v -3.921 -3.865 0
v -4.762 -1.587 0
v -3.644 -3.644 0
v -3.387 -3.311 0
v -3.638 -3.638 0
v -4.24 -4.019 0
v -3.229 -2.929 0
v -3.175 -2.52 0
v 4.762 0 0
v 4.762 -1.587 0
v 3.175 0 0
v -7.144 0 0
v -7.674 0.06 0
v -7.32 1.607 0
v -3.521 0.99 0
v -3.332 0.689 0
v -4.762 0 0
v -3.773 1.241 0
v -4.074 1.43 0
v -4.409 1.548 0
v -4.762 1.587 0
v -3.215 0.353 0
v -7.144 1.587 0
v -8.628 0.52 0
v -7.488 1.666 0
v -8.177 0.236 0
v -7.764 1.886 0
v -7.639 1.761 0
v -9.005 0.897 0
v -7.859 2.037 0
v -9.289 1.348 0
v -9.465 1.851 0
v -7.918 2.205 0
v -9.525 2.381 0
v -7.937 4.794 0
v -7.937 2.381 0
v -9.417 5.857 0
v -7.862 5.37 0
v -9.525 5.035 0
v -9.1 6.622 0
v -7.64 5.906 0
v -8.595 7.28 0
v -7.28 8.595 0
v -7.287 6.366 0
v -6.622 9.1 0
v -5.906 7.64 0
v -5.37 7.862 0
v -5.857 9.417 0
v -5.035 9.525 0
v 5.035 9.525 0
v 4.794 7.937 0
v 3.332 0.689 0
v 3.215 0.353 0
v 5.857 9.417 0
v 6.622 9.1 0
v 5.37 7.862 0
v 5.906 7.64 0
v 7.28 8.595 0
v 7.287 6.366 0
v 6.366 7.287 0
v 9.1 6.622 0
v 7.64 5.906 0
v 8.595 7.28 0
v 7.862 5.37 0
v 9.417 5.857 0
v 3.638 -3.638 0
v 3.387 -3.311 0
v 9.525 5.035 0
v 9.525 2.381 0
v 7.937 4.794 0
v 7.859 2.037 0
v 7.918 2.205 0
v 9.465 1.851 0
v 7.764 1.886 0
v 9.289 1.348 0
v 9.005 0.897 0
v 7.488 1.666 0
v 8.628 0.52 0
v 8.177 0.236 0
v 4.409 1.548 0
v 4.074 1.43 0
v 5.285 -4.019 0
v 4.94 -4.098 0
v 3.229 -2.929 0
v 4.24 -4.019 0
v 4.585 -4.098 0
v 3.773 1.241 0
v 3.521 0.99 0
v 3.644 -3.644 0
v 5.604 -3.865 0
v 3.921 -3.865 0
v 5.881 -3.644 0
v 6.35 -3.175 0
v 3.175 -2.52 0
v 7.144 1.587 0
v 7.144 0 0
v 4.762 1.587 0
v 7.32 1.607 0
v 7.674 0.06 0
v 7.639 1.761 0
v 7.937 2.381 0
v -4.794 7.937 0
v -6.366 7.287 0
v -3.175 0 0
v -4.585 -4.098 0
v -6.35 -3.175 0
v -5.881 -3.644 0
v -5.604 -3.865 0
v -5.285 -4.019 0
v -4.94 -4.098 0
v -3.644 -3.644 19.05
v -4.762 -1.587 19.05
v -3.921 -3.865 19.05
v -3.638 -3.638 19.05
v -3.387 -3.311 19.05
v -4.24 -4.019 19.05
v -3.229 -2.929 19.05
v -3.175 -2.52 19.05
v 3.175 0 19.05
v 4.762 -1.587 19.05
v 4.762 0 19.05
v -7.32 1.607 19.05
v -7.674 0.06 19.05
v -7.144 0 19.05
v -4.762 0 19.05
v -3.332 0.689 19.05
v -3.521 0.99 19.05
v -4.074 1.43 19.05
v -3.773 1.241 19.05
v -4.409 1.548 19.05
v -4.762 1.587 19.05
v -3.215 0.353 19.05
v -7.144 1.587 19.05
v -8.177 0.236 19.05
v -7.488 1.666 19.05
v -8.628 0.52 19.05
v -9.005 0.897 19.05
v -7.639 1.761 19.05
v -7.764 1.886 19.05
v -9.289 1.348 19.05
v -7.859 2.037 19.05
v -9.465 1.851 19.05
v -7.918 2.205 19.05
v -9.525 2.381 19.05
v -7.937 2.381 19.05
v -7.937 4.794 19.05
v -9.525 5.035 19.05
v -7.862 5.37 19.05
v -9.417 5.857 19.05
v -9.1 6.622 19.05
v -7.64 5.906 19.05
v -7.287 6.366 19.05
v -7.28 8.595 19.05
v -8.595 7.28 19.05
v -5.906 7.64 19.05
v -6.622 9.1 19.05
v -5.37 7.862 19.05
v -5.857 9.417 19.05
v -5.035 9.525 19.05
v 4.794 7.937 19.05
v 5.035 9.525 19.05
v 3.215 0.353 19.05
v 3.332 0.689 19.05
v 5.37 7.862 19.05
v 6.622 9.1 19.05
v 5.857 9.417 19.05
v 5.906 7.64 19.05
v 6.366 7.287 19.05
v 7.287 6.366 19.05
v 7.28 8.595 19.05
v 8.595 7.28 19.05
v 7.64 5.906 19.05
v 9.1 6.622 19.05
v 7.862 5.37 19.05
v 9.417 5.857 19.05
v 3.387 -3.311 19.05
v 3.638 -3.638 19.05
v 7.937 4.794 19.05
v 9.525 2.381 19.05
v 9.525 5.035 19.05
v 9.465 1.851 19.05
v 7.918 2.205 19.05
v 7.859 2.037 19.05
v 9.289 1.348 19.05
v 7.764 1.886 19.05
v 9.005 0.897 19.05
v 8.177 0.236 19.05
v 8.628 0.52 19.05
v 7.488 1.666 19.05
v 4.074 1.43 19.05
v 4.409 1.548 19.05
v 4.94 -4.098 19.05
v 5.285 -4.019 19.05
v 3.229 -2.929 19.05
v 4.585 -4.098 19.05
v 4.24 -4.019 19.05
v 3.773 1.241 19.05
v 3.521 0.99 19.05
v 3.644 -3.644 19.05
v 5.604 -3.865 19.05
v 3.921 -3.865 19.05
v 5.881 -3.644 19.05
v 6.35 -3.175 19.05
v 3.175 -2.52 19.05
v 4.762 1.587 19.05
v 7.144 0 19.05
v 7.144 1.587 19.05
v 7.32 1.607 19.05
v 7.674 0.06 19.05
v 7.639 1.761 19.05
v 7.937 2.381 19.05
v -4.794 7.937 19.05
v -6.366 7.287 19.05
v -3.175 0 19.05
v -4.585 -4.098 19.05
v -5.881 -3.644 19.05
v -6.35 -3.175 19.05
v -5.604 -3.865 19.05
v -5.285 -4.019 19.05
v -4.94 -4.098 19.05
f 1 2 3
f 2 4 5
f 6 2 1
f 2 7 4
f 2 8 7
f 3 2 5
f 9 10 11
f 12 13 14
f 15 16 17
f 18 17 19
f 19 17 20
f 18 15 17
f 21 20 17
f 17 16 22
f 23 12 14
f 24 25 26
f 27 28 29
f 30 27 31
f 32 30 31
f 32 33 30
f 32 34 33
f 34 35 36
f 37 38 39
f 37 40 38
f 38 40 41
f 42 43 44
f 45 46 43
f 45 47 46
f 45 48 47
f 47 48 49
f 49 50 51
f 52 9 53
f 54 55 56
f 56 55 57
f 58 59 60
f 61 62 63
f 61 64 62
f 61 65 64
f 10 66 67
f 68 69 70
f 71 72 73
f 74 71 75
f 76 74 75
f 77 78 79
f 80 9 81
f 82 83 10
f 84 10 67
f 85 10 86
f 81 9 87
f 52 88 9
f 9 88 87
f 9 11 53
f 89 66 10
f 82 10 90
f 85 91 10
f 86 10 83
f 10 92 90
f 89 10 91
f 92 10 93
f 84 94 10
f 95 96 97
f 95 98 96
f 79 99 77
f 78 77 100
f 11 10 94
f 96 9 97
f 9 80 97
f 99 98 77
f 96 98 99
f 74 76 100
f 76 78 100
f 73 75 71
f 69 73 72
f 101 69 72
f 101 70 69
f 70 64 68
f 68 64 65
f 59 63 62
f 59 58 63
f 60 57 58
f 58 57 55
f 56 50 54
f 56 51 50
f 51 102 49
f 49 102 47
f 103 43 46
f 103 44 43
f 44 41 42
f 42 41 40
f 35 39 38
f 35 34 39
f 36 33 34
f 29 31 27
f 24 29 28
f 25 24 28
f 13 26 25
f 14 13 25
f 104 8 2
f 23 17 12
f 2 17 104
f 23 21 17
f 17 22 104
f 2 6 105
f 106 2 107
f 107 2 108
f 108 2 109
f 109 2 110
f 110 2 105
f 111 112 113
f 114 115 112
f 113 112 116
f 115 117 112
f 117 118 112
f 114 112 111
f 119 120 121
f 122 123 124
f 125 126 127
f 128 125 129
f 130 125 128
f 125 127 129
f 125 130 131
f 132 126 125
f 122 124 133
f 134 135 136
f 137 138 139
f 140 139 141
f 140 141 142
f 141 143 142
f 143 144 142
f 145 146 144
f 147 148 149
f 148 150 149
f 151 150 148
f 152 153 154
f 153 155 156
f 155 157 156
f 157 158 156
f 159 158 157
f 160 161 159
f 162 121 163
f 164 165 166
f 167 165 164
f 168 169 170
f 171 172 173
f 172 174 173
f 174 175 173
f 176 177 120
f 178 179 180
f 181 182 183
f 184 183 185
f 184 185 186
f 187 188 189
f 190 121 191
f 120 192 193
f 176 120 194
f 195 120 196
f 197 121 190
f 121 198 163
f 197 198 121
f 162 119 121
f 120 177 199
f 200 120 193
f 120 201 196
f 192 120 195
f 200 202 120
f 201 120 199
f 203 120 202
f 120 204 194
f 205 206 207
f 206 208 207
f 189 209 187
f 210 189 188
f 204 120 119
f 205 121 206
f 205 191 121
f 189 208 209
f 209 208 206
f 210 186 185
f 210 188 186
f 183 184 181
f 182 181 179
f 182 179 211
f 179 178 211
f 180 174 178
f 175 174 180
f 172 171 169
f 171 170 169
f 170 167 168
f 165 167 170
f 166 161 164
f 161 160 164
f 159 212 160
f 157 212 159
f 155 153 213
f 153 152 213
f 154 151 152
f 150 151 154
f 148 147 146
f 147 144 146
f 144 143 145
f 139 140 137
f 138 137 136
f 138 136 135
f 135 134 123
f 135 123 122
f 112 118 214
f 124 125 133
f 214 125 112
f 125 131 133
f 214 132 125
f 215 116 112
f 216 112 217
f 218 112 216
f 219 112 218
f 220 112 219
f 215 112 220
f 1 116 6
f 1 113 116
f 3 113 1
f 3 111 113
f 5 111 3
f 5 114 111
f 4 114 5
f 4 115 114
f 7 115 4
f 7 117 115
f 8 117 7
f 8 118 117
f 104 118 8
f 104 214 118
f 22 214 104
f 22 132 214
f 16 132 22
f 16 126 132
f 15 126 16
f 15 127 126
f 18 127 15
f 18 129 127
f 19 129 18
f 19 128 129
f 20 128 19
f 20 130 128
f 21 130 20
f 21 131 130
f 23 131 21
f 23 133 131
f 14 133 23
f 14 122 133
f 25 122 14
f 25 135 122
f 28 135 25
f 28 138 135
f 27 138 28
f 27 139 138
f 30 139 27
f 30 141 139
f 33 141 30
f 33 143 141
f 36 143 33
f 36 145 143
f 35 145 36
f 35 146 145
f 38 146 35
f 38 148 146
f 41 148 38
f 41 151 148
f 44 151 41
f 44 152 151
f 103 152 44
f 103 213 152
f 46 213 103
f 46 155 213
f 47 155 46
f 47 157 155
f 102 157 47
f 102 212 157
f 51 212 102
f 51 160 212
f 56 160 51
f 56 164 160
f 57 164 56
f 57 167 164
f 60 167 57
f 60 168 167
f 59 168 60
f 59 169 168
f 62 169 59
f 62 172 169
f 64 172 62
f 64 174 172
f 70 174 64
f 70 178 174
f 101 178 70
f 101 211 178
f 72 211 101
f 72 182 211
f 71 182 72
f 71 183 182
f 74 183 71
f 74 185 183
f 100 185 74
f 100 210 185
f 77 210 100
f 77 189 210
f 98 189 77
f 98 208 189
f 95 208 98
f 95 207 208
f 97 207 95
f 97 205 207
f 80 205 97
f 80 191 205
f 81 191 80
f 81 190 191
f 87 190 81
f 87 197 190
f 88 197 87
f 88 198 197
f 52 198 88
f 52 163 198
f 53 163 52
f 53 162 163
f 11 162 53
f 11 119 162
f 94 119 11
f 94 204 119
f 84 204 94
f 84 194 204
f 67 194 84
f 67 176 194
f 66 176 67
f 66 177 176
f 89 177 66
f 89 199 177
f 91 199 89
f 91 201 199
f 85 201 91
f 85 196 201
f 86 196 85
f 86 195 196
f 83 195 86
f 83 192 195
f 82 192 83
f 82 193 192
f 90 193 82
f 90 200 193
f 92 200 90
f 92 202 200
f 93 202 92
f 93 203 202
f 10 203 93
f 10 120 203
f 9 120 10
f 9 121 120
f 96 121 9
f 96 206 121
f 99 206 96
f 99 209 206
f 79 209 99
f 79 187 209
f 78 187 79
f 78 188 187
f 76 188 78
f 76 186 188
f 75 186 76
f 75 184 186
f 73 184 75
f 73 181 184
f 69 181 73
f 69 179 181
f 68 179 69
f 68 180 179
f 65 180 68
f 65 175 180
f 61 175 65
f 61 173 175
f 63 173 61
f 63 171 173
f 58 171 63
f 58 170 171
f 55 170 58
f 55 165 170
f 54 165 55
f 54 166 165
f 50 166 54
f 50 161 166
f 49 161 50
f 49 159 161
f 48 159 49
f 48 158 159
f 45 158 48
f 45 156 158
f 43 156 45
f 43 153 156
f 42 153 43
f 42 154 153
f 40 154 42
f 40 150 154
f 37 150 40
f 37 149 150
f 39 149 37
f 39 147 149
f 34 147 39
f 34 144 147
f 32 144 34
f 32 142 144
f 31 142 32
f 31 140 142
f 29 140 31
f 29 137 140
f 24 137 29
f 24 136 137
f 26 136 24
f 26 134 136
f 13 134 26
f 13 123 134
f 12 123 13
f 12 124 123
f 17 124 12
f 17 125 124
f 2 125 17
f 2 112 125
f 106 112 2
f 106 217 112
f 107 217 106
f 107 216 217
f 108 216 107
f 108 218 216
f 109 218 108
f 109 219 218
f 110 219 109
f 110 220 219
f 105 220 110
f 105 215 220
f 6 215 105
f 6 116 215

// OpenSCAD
// file: ../lib/TOGArrayLib1.scad
// TOGArrayLib1.5
// 
// Functions for working with arrays.
// 
// v1.1:
// - tal1_reduce assert(is_list(items)) to prevent infinite recursion
//   when given undefined or other non-list values
// v1.1.1:
// - Fix tal1_uniq_remap_v2 to return "list-remap-result" as the
//   first element of the returned list
// v1.2:
// - Add tal1_replace_at function
// v1.3:
// - tal1_is_vec_of, tal1_is_vec_of_num
// v1.4:
// - tal1_assert_for_each, for when you want to assert something
//   about each of a list of items and get nice failure messages
// v1.5:
// - Add tal1_duplicate_reversed function, which may be
//   handy when generating symmetrical polygons and stuff.

/**
 * Make a list with the contents of list `a`,
 * but starting at offset `off`, replaced by the contents of list `b`.
 * len(result) = max(len(a), off+len(b))
 */
function tal1_replace_at(a, off, b, default_value=undef, default_value_function=undef) =
	assert(is_list(a))
	assert(is_list(b))
	let( _dvf = !is_undef(default_value_function) ? default_value_function : function(i) default_value )
[
	for( i=[0:1:min(off,len(a))-1] ) a[i],
	for( i=[len(a):1:off-1] ) _dvf(i),
	for( i=[off:1:off+len(b)-1] ) b[i-off],
	for( i=[off+len(b):1:len(a)-1] ) a[i],
];

// Simplest case
assert([] == tal1_replace_at([], 0, []));
// Second simplest cases
assert(["foo"] == tal1_replace_at(["foo"], 0, []));
assert(["foo"] == tal1_replace_at([], 0, ["foo"]));
// Replace one item
assert(["foo","quux","baz"] == tal1_replace_at(["foo","bar","baz"], 1, ["quux"]));
// Replace and extend
assert(["foo","quux","tuna","tina"] == tal1_replace_at(["foo","bar","baz"], 1, ["quux", "tuna", "tina"]));
// Add beyond end of `a`
assert(["foo","zzz","quux"] == tal1_replace_at(["foo"], 2, ["quux"], default_value="zzz"));
// Adding 'nothing' should still fill to that point with defaults
assert(["foo","zzz","zzz"] == tal1_replace_at(["foo"], 3, [], default_value="zzz"));


function tal1_reduce(start, items, func, offset=0) =
	assert(is_list(items))
	len(items) == offset ? start :
	tal1_reduce(func(start, items[offset]), items, func, offset+1);

function tal1_consecutive_duplicate_count(items) = tal1_reduce(
	[0, undef],
	items,
	function(z,item) [z[0] + (item == z[1] ? 1 : 0), item]
)[0];

assert(0 == tal1_consecutive_duplicate_count([]));
assert(0 == tal1_consecutive_duplicate_count([50]));
assert(1 == tal1_consecutive_duplicate_count([50,50]));
assert(0 == tal1_consecutive_duplicate_count([50,51,52,53]));
assert(1 == tal1_consecutive_duplicate_count([50,51,52,52]));
assert(3 == tal1_consecutive_duplicate_count([50,50,50,50]));

// Set test_size to arbirarily large values
// to ensure that OpenSCAD can handle heavy recursion
let(test_size=1000) assert(test_size/2 == tal1_consecutive_duplicate_count([for(i=[0:1:test_size-1]) floor(i/2)]));



function tal1_uniq_(items, off0, off1) =
	let(chunklen = off1-off0)
	chunklen == 0 ? [] :
	chunklen == 1 ? [items[off0]] :
	let(half=floor(chunklen/2))
	let(left  = tal1_uniq_(items, off0     , off0+half))
	let(right = tal1_uniq_(items, off0+half, off1     ))
	assert(len(left) > 0)
	assert(len(right) > 0)
	left[len(left)-1] == right[0] ? [each left, for(i=[1:1:len(right)-1]) right[i]] :
	[each left, each right];

/** Given a list of items, returns a new list with identical consecutive items merged */
function tal1_uniq(items) = tal1_uniq_(items, 0, len(items));

assert([] == tal1_uniq([]));
assert([123] == tal1_uniq([123]));
assert([55,0,1,2,3] == tal1_uniq([55,0,1,2,3]));
assert([55,0,1,2] == tal1_uniq([55,0,1,1,2]));
assert([55,0,1] == tal1_uniq([55,55,0,0,0,0,0,0,1,1,1,1]));
assert([55,0] == tal1_uniq([55,0,0,0,0,0,0,0]));



/**
 * Returns [new items, old index -> new index mapping].
 * No-op version.
 */
function tal1_uniq_remap_v1(items) =
	["list-remap-result", items, [for (vi=[0:1:len(items)-1]) vi]];

// [a, a, b, b, c, c]
//
// [a,    ...], []  -> [a],[0]
// [a, a, ...], [0] -> [a],[0,0]

assert([1,2,3] == [1,2,3]);

/**
 * Recursive version that will combine adjacent identical vertexes,
 * but will use the original items.
 */
function tal1_uniq_remap_v2(items, map=[]) =
	let(index = len(map))
	len(items) == index ? ["list-remap-result", items, map] :
	index == 0 ? tal1_uniq_remap_v2(items, [0]) :
	items[index] == items[map[index-1]] ? tal1_uniq_remap_v2(items, [for(vi=map) vi, map[index-1]]) :
	tal1_uniq_remap_v2(items, [for(vi=map) vi, index]);

assert(tal1_uniq_remap_v2([1,1,2,2,3,4]) == ["list-remap-result", [1,1,2,2,3,4], [0,0,2,2,4,5]]);


/**
 * Returns true if `vec` is a list of at least min_len items
 * and component_check(each item, even those beyond min_len) is true.
 */
function tal1_is_vec_of(vec, min_len=0, component_check=function(x) true) =
	assert(is_num(min_len) && min_len >= 0)
	assert(is_function(component_check))
	is_list(vec) && len(vec) >= min_len &&
	tal1_reduce(true, vec, function(prev,item) prev && component_check(item));

function tal1_is_vec_of_num(vec, min_len=0) = tal1_is_vec_of(vec, min_len, function(i) is_num(i));

assert( true == tal1_is_vec_of_num([1,2,3]));
assert( true == tal1_is_vec_of_num([]));
assert( true == tal1_is_vec_of_num([1,2,3], 3));
assert(false == tal1_is_vec_of_num([1,2], 3));
assert(false == tal1_is_vec_of_num([1,2,"spoon"], 3));
// Requirements are ambiguous when
// first min_len items are numbers, but there are non-numeric items afterwards,
// so let's error on the side of saying 'no, it's not a list of numbers';
// i.e. the item check and the min_len are independent.
assert(false == tal1_is_vec_of_num([1,2,3,"artichoke"], 3));


/**
 * Asserts that item_checker(each item in list, index of item)[0] is true.
 * Second element of item_checker return value is assertion message.
 * Returns the original list, in case that's useful to you.
 */
function tal1_assert_for_each(list, item_checker) =
	let( _ignored = [ for(i=[0:1:len(list)-1])
		let(q=item_checker(list[i],i))
		let(passed=is_bool(q) ? q : is_list(q) ? q[0] : assert(false, str(
			"tal1_assert_for_each: item_checker should return Bool|[Bool,String], but returned ",
			q, " for item at index ", i)))
		let(message=is_list(q) ? q[1] : undef)
		assert(passed, message)
		q
	])
	list;

// Callback can return a boolean...
assert([1,2,3] == tal1_assert_for_each([1,2,3], function(v,i) is_num(v)));
// ...or a [boolean, string]
assert([1,2,3] == tal1_assert_for_each([1,2,3], function(v,i) [is_num(v), "element be a num"]));

// [a, b, c] -> [a, b, c, rxf(c), rxf(b), rxf(a)]
function tal1_duplicate_reversed(list, rxf=function(item) item) =
	[
		each list,
		for( i=[len(list)-1 : -1 : 0] ) rxf(list[i]),
	];
// file: ../lib/TOGComplexLib1.scad
function tcplx1_multiply(a, b) =
	[a[0]*b[0] - a[1]*b[1], a[0]*b[1] + a[1]*b[0]];
function tcplx1_divide(a, b) =
	let(bot = (b[0]*b[0] + b[1]*b[1]))
	[
		(a[0]*b[0] + a[1]*b[1])/bot,
		(a[1]*b[0] - a[0]*b[1])/bot
	];

assert([-11,23] == tcplx1_multiply([3,2], [1,7]));

assert([-1,3] == tcplx1_multiply([3,1], [0,1]));
assert([-1,3] == tcplx1_multiply([0,1], [3,1]));

echo(tcplx1_divide([-1,3], [3,1]));
assert([0,1] == tcplx1_divide([-1,3], [3,1]));

function tcplx1_normalize(vec) =
	let(veclen = sqrt(vec[0]*vec[0]+vec[1]*vec[1]))
	[vec[0] / veclen, vec[1] / veclen];

function tcplx1_relative_turnvec_vv(v0, v1) =
	tcplx1_divide(tcplx1_normalize(v1), tcplx1_normalize(v0));

function tcplx1_relative_turnvec_abc(p0, p1, p2) = tcplx1_relative_turnvec_vv(p1-p0, p2-p1);

// A 90-degree turn
assert([0,1] == tcplx1_relative_turnvec_abc([0,0], [1,0], [1,1]));
assert([0,1] == tcplx1_relative_turnvec_abc([0,0], [0,1], [-1,1]));

// A 45-degree turn
assert(tcplx1_normalize([1,1]) == tcplx1_relative_turnvec_abc([0,0], [1,0], [ 2,1]));
assert(tcplx1_normalize([1,1]) == tcplx1_relative_turnvec_abc([0,0], [0,1], [-1,2]));


function tcplx1_relative_angle_abc(p0, p1, p2) =
	let(turnvec = tcplx1_relative_turnvec_abc(p0, p1, p2))
	atan2(turnvec[1], turnvec[0]);

assert(-135 == tcplx1_relative_angle_abc([0,0], [1,0], [0,-1]));
assert( -90 == tcplx1_relative_angle_abc([0,0], [1,0], [1,-1]));
assert(   0 == tcplx1_relative_angle_abc([0,0], [1,0], [2, 0]));
assert(  90 == tcplx1_relative_angle_abc([0,0], [1,0], [1, 1]));
assert( 135 == tcplx1_relative_angle_abc([0,0], [1,0], [0, 1]));

assert(  90 == tcplx1_relative_angle_abc([1,1], [3,3], [1, 5]));
// file: ../lib/TOGMod1Constructors.scad
// TOGMod1Constructors-v1.11
// 
// Functions to construct objects understood by TOGMod1
// 
// v1.1:
// - Add togmod1_make_rounded_rect
// v1.2:
// - togmod1_make_rounded_rect can make ovals
// v1.3:
// - togmod1_circle_points, to just get the points of a circle
// - if pos parameter to circle function has a third element,
//   returned vertexes will include it as the z component;
// v1.3.1
// - Some assertions
// v1.4:
// - Refactor togmod1_rounded_rect_points and togmod1_circle_points
//   to use togmod1__make_nd_vector_adder for adapting to whatever
//   `pos` parameter is.
// v1.5:
// - togmod_rounded_rect_points will not simplify completely rounded sides
//   (where length of side is exactly twice the rounding radius)
//   unless simplify_rounded_sides=true
//   - This makes it more useful for polyhedron generation,
//     where radius varies, but number of points must remain constant.
// v1.6:
// - togmod1_make_rect makes a simple rectangle
// - togmod1_make_rounded_rect will defer to togmod1_make_rect when r=0
// v1.7:
// - togmod1_make_circle will return empty shape (["union"]) when d=0
// v1.8:
// - Add togmod1_text
// v1.9:
// - togmod1_circle_points uses 3 as minimum circle point count instead of 6
// v1.10:
// - Fix togmod1_linear_extrude_y so that range corresponds to Y start/end and
//   polygon X,Y correspond to X,Z.  Previously it was rotated wrongly,
//   which would have gone unnoticed for symmetrical shapes centered at 0,0.
// v1.11:
// - Remove an 'echo'

use <./TOGArrayLib1.scad>

function togmod1__make_nd_vector_adder(origin=[0,0]) =
	let(origin_is_zero = tal1_reduce(true, origin, function(prev,item) prev && item == 0))
	origin_is_zero ? (function(vec) len(vec) >= len(origin) ? vec : tal1_replace_at(origin, 0, vec)) :
	function(vec) [
		for(i=[0:1:max(len(origin),len(vec))-1]) (len(vec) > i ? vec[i] : 0) + (len(origin) > i ? origin[i] : 0),
	];

assert([1,2,3] == togmod1__make_nd_vector_adder()([1,2,3]));
assert([1,2,3] == togmod1__make_nd_vector_adder([0,0,3])([1,2]));


function togmod1_make_cuboid(size) =
	assert(is_list(size))
	assert(len(size) >= 3)
	assert(is_num(size[0]))
	assert(is_num(size[1]))
	assert(is_num(size[2]))
	["polyhedron-vf", [
		[-size[0]/2, -size[1]/2, -size[2]/2],
		[+size[0]/2, -size[1]/2, -size[2]/2],
		[-size[0]/2, +size[1]/2, -size[2]/2],
		[+size[0]/2, +size[1]/2, -size[2]/2],
		[-size[0]/2, -size[1]/2, +size[2]/2],
		[+size[0]/2, -size[1]/2, +size[2]/2],
		[-size[0]/2, +size[1]/2, +size[2]/2],
		[+size[0]/2, +size[1]/2, +size[2]/2]
	], [
		[0,1,3,2],[0,4,5,1],[4,6,7,5],[3,7,6,2],[1,5,7,3],[6,4,0,2]
	]];

function togmod1_make_polygon(verts) =
	["polygon-vp", verts, [[for( i=[0:1:len(verts)-1] ) i%len(verts)]]];

function togmod1_rounded_rect_points(size, r, pos=[0,0], simplify_rounded_sides=false) =
	assert(is_list(size))
	assert(len(size) >= 2)
	let(radii = is_list(r) ? r : is_num(r) ? [r,r] : assert(false, "rounded_rect r(adius) should be list<num> or num"))
	let(rx = radii[0])
	let(ry = radii[1])
	assert(is_num(rx))
	assert(is_num(ry))
	assert(size[0] >= 2*rx, str("size[0] must be >= 2*r[0]; size[0] = ",size[0],", 2*r[0] = ",2*rx))
	assert(size[1] >= 2*ry, str("size[1] must be >= 2*r[1]; size[1] = ",size[1],", 2*r[1] = ",2*ry))
	let(quarterfn=max($fn/4, 1))
	let(qfnx = simplify_rounded_sides && size[0] == 2*rx ? quarterfn-1 : quarterfn)
	let(qfny = simplify_rounded_sides && size[1] == 2*ry ? quarterfn-1 : quarterfn)
	let(finalizepos = togmod1__make_nd_vector_adder(pos))
[
	for(a=[0 : 1 : qfnx]) let(ang=      a*90/quarterfn) finalizepos([ size[0]/2-rx + rx*cos(ang),  size[1]/2-ry + ry*sin(ang)]),
	for(a=[0 : 1 : qfny]) let(ang= 90 + a*90/quarterfn) finalizepos([-size[0]/2+rx + rx*cos(ang),  size[1]/2-ry + ry*sin(ang)]),
	for(a=[0 : 1 : qfnx]) let(ang=180 + a*90/quarterfn) finalizepos([-size[0]/2+rx + rx*cos(ang), -size[1]/2+ry + ry*sin(ang)]),
	for(a=[0 : 1 : qfny]) let(ang=270 + a*90/quarterfn) finalizepos([ size[0]/2-rx + rx*cos(ang), -size[1]/2+ry + ry*sin(ang)]),
];

function togmod1_make_rect(size) =
	togmod1_make_polygon([
		[-size[0]/2, -size[1]/2],
		[+size[0]/2, -size[1]/2],
		[+size[0]/2, +size[1]/2],
		[-size[0]/2, +size[1]/2],
	]);

function togmod1_make_rounded_rect(size, r) =
	r == 0 ? togmod1_make_rect(size) :
	togmod1_make_polygon(togmod1_rounded_rect_points(size,r,simplify_rounded_sides=true));

/**
 * Returns points for an approximation of a circle where points are at distance r from pos.
 * Can be used to make other regular polygons, but the faces will be less than that
 * distance from pos (do some trig if you want face distance, e.g. for a hex nut).
 */
function togmod1_circle_points(r, pos=[0,0], d=undef) =
	assert( !is_undef(r) || !is_undef(d) )
	assert(!is_undef(pos[0]))
	assert(!is_undef(pos[1]))
	let(finalizepos = togmod1__make_nd_vector_adder(pos))
	let(r_ = !is_undef(r) ? r : d/2)
	let(fn = max($fn, 3))
	[for(i=[0 : 1 : fn-1]) finalizepos([r_*cos(i*360/fn), r_*sin(i*360/fn)])];

function togmod1_make_circle(r, pos=[0,0], d=undef) =
	r == 0 || d == 0 ? ["union"] :
	togmod1_make_polygon(togmod1_circle_points(r=r, pos=pos, d=d));

function togmod1_make_cylinder(d, zrange=[0,1], r=undef, pos=[0,0]) =
	assert( !is_undef(r) || !is_undef(d) )
	let( r_ = !is_undef(r) ? r : d/2 )
	// TODO: Make polyhedron directly
	["linear-extrude-zs", zrange, togmod1_make_circle(r=r_, pos=pos)];

function togmod1__is_range1d(range) = is_list(range) && len(range) == 2 && is_num(range[0]) && is_num(range[1]);

function togmod1_linear_extrude_z(range, shape) =
	assert(togmod1__is_range1d(range))
	["linear-extrude-zs", range, shape];
function togmod1_linear_extrude_x(range, shape) =
	assert(togmod1__is_range1d(range))
	["rotate", [90, 0, 90], togmod1_linear_extrude_z(range, shape)];
function togmod1_linear_extrude_y(range, shape) =
	assert(togmod1__is_range1d(range))
	["rotate", [90, 0,  0], togmod1_linear_extrude_z([-range[1], -range[0]], shape)];

function togmod1_text(text, size, font, halign, valign, spacing, direction, language, script) =
	["text-tsfhvsdls", text, size, font, halign, valign, spacing, direction, language, script];
// file: ../lib/TOGMod1.scad
// TOGMod1.9
// OpenSCAD library for representing shapes
// 
// See also: Functional OpenSCAD (https://github.com/thehans/FunctionalOpenSCAD)
// 
// v1.8:
// - Add `text-tsfhvsdls`
// v1.9
// - Add `offset-ds` (offset with _d_elta a _s_hape)

module togmod1_domodule(mod) {
	assert(is_list(mod));
	assert(len(mod) > 0);
	if( mod[0] == "polygon-vp" ) {
		// ["polygon-vp", vertexes, paths]
		polygon(points=mod[1], paths=mod[2]);
	} else if( mod[0] == "polyhedron-vf" ) {
		polyhedron(mod[1], faces=mod[2]);
	} else if( mod[0] == "scale" ) {
		assert(len(mod) == 3);
		scale(mod[1]) togmod1_domodule(mod[2]);
	} else if( mod[0] == "translate" ) {
		assert(len(mod) == 3);
		assert(is_list(mod[1]));
		for(c=mod[1]) assert(is_num(c), "translate component should be numeric");
		translate(mod[1]) togmod1_domodule(mod[2]);
	} else if( mod[0] == "rotate" ) {
		assert(len(mod) == 3);
		rotate(mod[1]) togmod1_domodule(mod[2]);
	} else if( mod[0] == "intersection" ) {
		intersection_for( i=[1:1:len(mod)-1] ) togmod1_domodule(mod[i]);
	} else if( mod[0] == "difference" ) {
		difference() {
			togmod1_domodule(mod[1]);
			for( i=[2:1:len(mod)-1] ) togmod1_domodule(mod[i]);
		}
	} else if( mod[0] == "union" ) {
		for( i=[1:1:len(mod)-1] ) togmod1_domodule(mod[i]);
	} else if( mod[0] == "hull" ) {
		hull() for( i=[1:1:len(mod)-1] ) togmod1_domodule(mod[i]);
	} else if( mod[0] == "offset-rs" ) {
		assert(len(mod) == 3);
		assert(is_num(mod[1]));
		assert(is_list(mod[2]));
		offset(mod[1]) togmod1_domodule(mod[2]);
	} else if( mod[0] == "linear-extrude-zs" ) {
		// ["linear-extrude-zs", [z0,z1], 2d_shape] // centered
		// ["linear-extrude-zs", height, 2d_shape]
		let( zrange = is_list(mod[1]) ? mod[1] : [-mod[1]/2, mod[1]/2] ) {
			translate([0,0,zrange[0]]) linear_extrude(zrange[1]-zrange[0]) togmod1_domodule(mod[2]);
		}
	} else if( mod[0] == "render" ) {
		render() togmod1_domodule(mod[1]);
	} else if( mod[0] == "minkowski" ) {
		minkowski() {
			togmod1_domodule(mod[1]);
			togmod1_domodule(mod[2]);
		}
	} else if( mod[0] == "x-debug" ) {
		# togmod1_domodule(mod[1]);
	} else if( mod[0] == "x-color" ) {
		color(mod[1]) togmod1_domodule(mod[2]);
	} else if( mod[0] == "text-tsfhvsdls" ) {
		text(text=mod[1], size=mod[2], font=mod[3], halign=mod[4], valign=mod[5], spacing=mod[6], direction=mod[7], language=mod[7], script=mod[8]);
	} else if( mod[0] == "offset-ds" ) {
		assert(is_num(mod[1]));
		assert(is_list(mod[2]));
		offset(delta=mod[1]) togmod1_domodule(mod[2]);
	} else {
		assert(false, str("Unrecognized shape: ", mod[0]));
	}
}
// main file
// Clarp2508.0.4
// 
// Generalization of Clarp2505.
// Experimental class of shapes defined by offset (from 'top left
// corner of female block') and width of mating surface.
// 
// v0.1:
// - Define female shape
// v0.2:
// - Define male shape
// v0.3:
// - Adjustments to male shape to allow ms_x=1.5u to work
// v0.4:
// - Male shape avoids carving into flange when depth insufficient
// - Clarp2508-flangeless-male shape option
// 
// TODO: Parse ms_* params from a string, like Clarp2508:2.5u,2.5u,1u,
// so that it can be referenced by Clarp2507 or whatever.
// 
// TODO: Male shapes should be able to handle outer_depth = 0 (then they just act like a rail)

part = "Clarp2508-male"; // ["Clarp2508-male","Clarp2508-female","Clarp2508-flangeless-male"]
ms_pos_u = [2.5, -1.5]; // 0.05
ms_width_u = 1; // 0.05
outer_width_u = 12;
outer_depth_u =  6;
thickness_u = 1.0; // 0.05
length_u = 12;
$fn = 32;

module clarp2508__end_params() { }

u = 254/160;

use <../lib/TOGMod1.scad>
use <../lib/TOGPath1.scad>
use <../lib/TOGMod1Constructors.scad>

function clarp2508__mirror_point(point) = [-point[0], point[1]];

function clarp2508__mirror_rathnode(node) = [
	node[0],
	clarp2508__mirror_point(node[1]),
	for(i=[2:1:len(node)-1]) node[i]
];

function clarp2508__reverse_list(list) = [
	for(i=[len(list)-1:-1:0]) list[i]
];

function clarp2508__mirror_rathnodes(nodes, translation=0) = [
	each                         [for(n=nodes)                            n ] ,
	each clarp2508__reverse_list([for(n=nodes) clarp2508__mirror_rathnode(n)]),
];

function clarp2508_ms_points(ms_pos, ms_width, x0) = [
	[x0 + ms_pos[0] - ms_width/2, ms_pos[1] - ms_width/2],
	[x0 + ms_pos[0] + ms_width/2, ms_pos[1] + ms_width/2],
];

function clarp2508_make_f_rath(ms_pos, ms_width, outer_width, outer_depth, thickness=1*u, top_inner_bevel=0.5*u, outer_bevel=2*u) =
	// TODO: Some assertions about minimum width, depth
	let(x0 = -outer_width/2)
	let(y0 = -outer_depth)
	let(ms_points = clarp2508_ms_points(ms_pos, ms_width, x0))
	let(ms_point_a = ms_points[0])
	let(ms_point_z = ms_points[len(ms_points)-1])
	let(ib_y1 = y0+outer_bevel+thickness/2) // Top of inner bevel
	let(sl_y0 = max(ib_y1+0.1, ms_point_a[1]-(ms_point_a[0]-(x0+thickness)))) // bottom of sublip underside
	let(sl_r0 = 2*min(sl_y0-ib_y1, ms_point_a[1]-sl_y0)) // rounding radius of bottom of sublip underside
	["togpath1-rath", each clarp2508__mirror_rathnodes([
		["togpath1-rathnode", [x0+thickness+outer_bevel-thickness/2, y0+thickness], ["round", outer_bevel-thickness]],
		["togpath1-rathnode", [x0+thickness, ib_y1], ["round", outer_bevel-thickness]], // TODO: min(bevel, something) when depth is low
		["togpath1-rathnode", [x0+thickness, sl_y0], if(sl_r0 > 0) ["round", sl_r0]],
		each [for(p=ms_points) ["togpath1-rathnode", p]],
		["togpath1-rathnode", [ms_point_z[0],    0  ], ["bevel", top_inner_bevel]],
		["togpath1-rathnode", [       x0    ,    0  ]],
		["togpath1-rathnode", [       x0    , y0+outer_bevel], ["round", outer_bevel]],
		["togpath1-rathnode", [       x0+outer_bevel, y0    ], ["round", outer_bevel]],
	])];

function clarp2508_make_flangeless_m_rath(ms_pos, ms_width, outer_width, outer_depth, thickness=1*u, top_inner_bevel=0.5*u, outer_bevel=2*u) =
	let(x0 = -outer_width/2)
	let(y1 =  outer_depth)
	let(ms_points = clarp2508_ms_points(ms_pos, ms_width, x0))
	let(ms_point_a = ms_points[0])
	let(ms_point_z = ms_points[len(ms_points)-1])
	let(r0 = min(ms_width, thickness)*255/256)
	let(r1 = min(thickness*1.5, ms_pos[0]+ms_width/2))
	["togpath1-rath", each clarp2508__mirror_rathnodes([
		["togpath1-rathnode", [ms_point_z[0]+thickness, y1-thickness], ["round", thickness]],
		["togpath1-rathnode", [ms_point_z[0]+thickness, ms_point_a[1]-ms_width+thickness], ["round", r0]],
		["togpath1-rathnode", [ms_point_a[0]+ms_width, ms_point_a[1]-ms_width], ["round", r0]],
		each [for(p=ms_points) ["togpath1-rathnode", p]],
		["togpath1-rathnode", [ms_point_z[0],    y1  ], ["round", thickness*2]],
	])];

function clarp2508_make_m_rath(ms_pos, ms_width, outer_width, outer_depth, thickness=1*u, top_inner_bevel=0.5*u, outer_bevel=2*u) =
	let(x0 = -outer_width/2)
	let(y1 =  outer_depth)
	let(ms_points = clarp2508_ms_points(ms_pos, ms_width, x0))
	let(ms_point_a = ms_points[0])
	let(ms_point_z = ms_points[len(ms_points)-1])
	let(r0 = min(ms_width, thickness)*255/256)
	let(r1 = min(outer_depth, thickness*1.5, ms_pos[0]+ms_width/2))
	let(flange_inner_depth = outer_depth - thickness*2 )
	let(_outer_bevel = max(0,min(outer_bevel, (outer_depth-r1)*0.6)))
	let(ib = let(b=_outer_bevel-thickness*0.6) b + 2*thickness > outer_depth ? 0 : b)
	//assert(ib > 0, str("Too short for this shape; maybe use flangeless-male, instead"))
	["togpath1-rath", each clarp2508__mirror_rathnodes([
		each flange_inner_depth > 0 ? [
			["togpath1-rathnode", [x0+thickness, y1-thickness], if(ib > 0) ["bevel", ib], if(ib > 0)["round", ib]],
			["togpath1-rathnode", [x0+thickness, thickness], ["round", max(0, r1-thickness)]],
			["togpath1-rathnode", [ms_point_z[0]+thickness, thickness], ["round", thickness]],
		] : [
			["togpath1-rathnode", [ms_point_z[0]+thickness, y1-thickness], ["round", thickness]],
		],
		["togpath1-rathnode", [ms_point_z[0]+thickness, ms_point_a[1]-ms_width+thickness], ["round", r0]],
		["togpath1-rathnode", [ms_point_a[0]+ms_width, ms_point_a[1]-ms_width], ["round", r0]],
		each [for(p=ms_points) ["togpath1-rathnode", p]],
		["togpath1-rathnode", [ms_point_z[0],    0  ], /*["bevel", top_inner_bevel]*/],
		["togpath1-rathnode", [       x0    ,    0  ], ["round", r1]],
		["togpath1-rathnode", [       x0    ,   y1  ], if(_outer_bevel>0)["bevel", _outer_bevel], if(_outer_bevel>0)["round", _outer_bevel]],
	])];

// When this graduates from 'experimental',
// this could be part of Clarp2505, and use clgeneric
function clarp2508_rath_to_part(rath) = togmod1_linear_extrude_z([0, length_u*u], togpath1_rath_to_polygon(rath));

togmod1_domodule(clarp2508_rath_to_part(
	part == "Clarp2508-flangeless-male" ? clarp2508_make_flangeless_m_rath(ms_pos_u*u, ms_width_u*u, outer_width_u*u, outer_depth_u*u, thickness=thickness_u*u) :
	part == "Clarp2508-male" ? clarp2508_make_m_rath(ms_pos_u*u, ms_width_u*u, outer_width_u*u, outer_depth_u*u, thickness=thickness_u*u) :
	part == "Clarp2508-female" ? clarp2508_make_f_rath(ms_pos_u*u, ms_width_u*u, outer_width_u*u, outer_depth_u*u, thickness=thickness_u*u) :
	assert(false, str("Unknown part: '", part, "'"))
));
